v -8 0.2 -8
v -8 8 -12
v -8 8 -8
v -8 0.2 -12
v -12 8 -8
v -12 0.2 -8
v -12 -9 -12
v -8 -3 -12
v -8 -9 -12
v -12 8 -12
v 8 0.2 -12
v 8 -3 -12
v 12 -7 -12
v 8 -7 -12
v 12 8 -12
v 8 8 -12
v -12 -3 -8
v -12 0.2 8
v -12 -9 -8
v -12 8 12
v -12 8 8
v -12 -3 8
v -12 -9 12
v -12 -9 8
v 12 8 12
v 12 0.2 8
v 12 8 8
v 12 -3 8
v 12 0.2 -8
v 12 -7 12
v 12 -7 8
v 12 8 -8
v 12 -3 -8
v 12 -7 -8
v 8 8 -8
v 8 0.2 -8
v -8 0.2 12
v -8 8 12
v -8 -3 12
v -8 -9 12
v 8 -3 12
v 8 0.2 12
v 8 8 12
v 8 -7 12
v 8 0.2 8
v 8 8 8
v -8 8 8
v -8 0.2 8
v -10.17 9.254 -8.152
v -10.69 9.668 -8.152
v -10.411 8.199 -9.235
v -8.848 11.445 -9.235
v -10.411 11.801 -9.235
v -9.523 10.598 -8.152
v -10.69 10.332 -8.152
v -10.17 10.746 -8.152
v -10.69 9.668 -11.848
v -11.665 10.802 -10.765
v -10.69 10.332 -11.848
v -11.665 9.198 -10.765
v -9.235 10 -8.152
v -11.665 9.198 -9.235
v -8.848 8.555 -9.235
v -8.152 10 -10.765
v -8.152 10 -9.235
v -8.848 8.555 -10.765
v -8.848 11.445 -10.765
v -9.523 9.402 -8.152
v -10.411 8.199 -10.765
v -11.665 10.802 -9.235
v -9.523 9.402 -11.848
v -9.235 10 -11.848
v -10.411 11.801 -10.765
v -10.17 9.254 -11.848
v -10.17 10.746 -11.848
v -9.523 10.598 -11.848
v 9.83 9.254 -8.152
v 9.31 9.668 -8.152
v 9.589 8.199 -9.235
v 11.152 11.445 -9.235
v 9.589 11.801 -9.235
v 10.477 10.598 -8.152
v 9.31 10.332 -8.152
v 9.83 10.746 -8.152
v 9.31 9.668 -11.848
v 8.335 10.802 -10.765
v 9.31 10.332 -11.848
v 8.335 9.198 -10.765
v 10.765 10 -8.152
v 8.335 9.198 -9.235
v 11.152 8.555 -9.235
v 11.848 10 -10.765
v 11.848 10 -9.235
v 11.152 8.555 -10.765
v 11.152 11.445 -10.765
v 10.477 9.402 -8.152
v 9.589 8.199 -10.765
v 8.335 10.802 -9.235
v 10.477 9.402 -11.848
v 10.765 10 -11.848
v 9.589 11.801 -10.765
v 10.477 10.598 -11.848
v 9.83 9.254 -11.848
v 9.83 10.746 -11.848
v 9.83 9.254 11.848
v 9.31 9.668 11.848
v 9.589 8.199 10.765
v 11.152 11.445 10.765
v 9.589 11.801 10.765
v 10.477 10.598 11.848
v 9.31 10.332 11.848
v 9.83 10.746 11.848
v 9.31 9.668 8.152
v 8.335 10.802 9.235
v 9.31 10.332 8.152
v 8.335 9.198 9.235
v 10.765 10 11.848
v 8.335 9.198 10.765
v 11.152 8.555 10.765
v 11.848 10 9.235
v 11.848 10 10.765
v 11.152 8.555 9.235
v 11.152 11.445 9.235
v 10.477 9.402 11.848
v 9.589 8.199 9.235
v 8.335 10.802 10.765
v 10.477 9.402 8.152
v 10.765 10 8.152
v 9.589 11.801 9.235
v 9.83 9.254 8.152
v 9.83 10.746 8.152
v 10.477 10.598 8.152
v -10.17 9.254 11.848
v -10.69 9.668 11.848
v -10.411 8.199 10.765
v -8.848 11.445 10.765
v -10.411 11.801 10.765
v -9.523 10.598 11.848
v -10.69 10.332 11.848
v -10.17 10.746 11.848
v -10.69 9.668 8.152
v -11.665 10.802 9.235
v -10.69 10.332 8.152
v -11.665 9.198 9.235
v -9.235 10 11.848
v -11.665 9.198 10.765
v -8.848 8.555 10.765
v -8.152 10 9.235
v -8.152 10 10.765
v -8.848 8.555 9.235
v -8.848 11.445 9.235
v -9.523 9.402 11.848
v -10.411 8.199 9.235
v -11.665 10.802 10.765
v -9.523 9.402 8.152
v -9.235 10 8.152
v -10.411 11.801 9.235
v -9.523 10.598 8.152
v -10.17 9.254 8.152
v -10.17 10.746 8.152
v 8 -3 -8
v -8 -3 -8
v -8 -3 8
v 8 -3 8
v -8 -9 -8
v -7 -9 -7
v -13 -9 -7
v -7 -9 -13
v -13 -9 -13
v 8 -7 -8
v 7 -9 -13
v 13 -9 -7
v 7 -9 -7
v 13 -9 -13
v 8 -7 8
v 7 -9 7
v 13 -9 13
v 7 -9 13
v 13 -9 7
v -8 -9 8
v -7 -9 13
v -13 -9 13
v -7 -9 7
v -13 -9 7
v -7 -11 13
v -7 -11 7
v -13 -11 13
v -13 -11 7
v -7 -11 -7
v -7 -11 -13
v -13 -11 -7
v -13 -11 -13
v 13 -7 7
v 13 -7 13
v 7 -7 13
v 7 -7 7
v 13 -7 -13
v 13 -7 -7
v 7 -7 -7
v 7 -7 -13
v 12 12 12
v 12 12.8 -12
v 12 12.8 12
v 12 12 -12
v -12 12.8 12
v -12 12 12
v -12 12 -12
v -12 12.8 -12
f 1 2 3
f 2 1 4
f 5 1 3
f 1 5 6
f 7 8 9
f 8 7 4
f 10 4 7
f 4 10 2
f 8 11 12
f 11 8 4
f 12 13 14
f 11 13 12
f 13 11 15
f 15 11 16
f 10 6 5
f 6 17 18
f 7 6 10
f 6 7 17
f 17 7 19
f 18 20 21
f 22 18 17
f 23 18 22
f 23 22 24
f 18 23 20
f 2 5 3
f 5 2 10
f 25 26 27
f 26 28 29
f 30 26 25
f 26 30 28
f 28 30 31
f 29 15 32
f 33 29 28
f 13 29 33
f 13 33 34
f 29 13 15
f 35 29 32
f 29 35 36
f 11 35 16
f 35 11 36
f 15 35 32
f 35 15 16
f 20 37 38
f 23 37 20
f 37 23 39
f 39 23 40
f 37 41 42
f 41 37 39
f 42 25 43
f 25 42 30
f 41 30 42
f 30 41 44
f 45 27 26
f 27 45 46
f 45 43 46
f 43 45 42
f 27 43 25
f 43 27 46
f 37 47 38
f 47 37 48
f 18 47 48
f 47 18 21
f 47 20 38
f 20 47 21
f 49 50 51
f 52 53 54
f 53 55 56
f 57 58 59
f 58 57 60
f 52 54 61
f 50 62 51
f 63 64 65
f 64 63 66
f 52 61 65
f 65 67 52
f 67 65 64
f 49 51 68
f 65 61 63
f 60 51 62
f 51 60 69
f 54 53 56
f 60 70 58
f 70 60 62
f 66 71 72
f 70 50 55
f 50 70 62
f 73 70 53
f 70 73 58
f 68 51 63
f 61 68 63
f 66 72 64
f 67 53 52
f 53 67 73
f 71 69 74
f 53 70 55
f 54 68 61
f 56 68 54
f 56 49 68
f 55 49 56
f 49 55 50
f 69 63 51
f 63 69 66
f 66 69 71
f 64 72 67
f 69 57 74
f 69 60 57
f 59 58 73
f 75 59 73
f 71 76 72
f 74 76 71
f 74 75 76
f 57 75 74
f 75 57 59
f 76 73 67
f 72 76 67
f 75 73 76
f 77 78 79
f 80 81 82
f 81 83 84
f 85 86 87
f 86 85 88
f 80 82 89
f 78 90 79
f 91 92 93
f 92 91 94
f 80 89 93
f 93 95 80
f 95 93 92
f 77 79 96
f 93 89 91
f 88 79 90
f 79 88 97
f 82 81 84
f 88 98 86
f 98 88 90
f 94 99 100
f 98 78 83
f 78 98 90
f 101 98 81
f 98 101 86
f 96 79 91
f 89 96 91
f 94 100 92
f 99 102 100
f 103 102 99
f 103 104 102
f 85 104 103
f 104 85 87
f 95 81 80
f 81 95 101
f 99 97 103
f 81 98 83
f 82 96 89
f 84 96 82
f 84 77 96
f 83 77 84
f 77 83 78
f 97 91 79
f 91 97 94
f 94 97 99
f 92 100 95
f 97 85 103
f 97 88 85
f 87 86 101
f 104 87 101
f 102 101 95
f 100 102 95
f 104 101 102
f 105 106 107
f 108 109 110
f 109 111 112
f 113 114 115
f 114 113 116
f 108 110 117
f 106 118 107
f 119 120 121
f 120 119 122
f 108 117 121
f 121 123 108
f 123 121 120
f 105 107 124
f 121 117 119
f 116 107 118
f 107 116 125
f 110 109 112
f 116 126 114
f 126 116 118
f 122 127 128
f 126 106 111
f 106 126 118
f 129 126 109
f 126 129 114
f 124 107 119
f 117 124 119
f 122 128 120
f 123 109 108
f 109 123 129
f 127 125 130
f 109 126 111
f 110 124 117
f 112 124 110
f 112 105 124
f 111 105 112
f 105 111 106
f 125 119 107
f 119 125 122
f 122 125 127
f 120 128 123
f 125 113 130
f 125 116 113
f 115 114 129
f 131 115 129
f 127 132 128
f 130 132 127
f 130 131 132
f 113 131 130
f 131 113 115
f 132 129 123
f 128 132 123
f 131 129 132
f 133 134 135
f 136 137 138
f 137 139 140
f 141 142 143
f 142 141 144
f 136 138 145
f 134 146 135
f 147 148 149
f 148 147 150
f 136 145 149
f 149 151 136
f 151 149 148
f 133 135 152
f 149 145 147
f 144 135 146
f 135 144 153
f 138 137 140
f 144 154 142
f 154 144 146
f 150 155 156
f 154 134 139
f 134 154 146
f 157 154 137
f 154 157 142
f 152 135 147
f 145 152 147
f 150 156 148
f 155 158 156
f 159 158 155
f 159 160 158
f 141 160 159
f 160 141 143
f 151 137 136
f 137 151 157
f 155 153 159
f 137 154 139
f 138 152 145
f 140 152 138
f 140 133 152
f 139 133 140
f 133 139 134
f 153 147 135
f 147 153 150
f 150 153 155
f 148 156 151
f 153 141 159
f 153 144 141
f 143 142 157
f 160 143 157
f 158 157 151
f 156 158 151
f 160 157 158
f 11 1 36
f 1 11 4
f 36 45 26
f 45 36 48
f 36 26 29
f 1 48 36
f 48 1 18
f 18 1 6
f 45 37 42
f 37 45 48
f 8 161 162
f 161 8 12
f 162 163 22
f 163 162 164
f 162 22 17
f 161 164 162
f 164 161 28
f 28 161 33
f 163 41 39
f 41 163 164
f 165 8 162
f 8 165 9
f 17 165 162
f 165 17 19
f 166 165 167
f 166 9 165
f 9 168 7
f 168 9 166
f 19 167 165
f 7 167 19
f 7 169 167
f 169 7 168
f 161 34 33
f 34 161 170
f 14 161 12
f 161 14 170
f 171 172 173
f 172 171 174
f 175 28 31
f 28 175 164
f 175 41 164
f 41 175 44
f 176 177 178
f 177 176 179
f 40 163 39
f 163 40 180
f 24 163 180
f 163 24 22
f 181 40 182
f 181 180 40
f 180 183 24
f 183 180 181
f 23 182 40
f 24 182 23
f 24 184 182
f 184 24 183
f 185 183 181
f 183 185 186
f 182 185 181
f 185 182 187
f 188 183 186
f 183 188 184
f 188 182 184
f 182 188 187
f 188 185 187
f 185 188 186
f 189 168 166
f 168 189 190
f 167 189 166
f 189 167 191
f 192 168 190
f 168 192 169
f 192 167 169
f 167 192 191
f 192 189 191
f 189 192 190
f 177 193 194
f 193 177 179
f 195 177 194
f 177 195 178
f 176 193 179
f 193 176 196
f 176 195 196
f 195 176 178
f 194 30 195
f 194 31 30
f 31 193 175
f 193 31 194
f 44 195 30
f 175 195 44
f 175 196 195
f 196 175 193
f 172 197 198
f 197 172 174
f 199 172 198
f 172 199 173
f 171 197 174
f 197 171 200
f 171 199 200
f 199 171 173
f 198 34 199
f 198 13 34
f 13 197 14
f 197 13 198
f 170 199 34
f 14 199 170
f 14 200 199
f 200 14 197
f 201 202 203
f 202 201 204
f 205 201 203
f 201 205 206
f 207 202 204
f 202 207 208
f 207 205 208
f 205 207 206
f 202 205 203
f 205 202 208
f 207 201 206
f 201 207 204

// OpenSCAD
translate([-12,0,-12])//we can use negative values only in translate function not in other like cube or sphere.

cube([4,8,4]);
translate([8,0,-12])
cube([4,8,4]);
translate([8,0,8])
cube([4,8,4]);
translate([-12,0,8])
cube([4,8,4]);
//Now we are adding spheres on top 
translate([-10,10,-10])
sphere(2);//sphere with radious 2
translate([10,10,-10])
sphere(2);
translate([10,10,10])
sphere(2);
translate([-10,10,10])
sphere(2);
//Now we are adding middle base for table pillers
translate([-12,-3,-12])
scale([3,0.4,3])
cube(8,0,12);
//now final pillars or base pillars
translate([-12,-9,-12])
 cube([4,6,4]);
translate([8,-9,-12])
cube([4,6,4]);
translate([8,-9,8])
cube([4,6,4]);
translate([-12,-9,8])
cube([4,6,4]);
//steps(paudian ;D

translate([-13,-11,7])
cube([6,2,6]);
translate([-13,-11,-13])
cube([6,2,6]);
translate([7,-9,7])
cube([6,2,6]);
translate([7,-9,-13])
cube([6,2,6]);
//upper base(sheesha)

translate([-12,12,-12])
scale([3,0.1,3])
cube(8,0,12);
